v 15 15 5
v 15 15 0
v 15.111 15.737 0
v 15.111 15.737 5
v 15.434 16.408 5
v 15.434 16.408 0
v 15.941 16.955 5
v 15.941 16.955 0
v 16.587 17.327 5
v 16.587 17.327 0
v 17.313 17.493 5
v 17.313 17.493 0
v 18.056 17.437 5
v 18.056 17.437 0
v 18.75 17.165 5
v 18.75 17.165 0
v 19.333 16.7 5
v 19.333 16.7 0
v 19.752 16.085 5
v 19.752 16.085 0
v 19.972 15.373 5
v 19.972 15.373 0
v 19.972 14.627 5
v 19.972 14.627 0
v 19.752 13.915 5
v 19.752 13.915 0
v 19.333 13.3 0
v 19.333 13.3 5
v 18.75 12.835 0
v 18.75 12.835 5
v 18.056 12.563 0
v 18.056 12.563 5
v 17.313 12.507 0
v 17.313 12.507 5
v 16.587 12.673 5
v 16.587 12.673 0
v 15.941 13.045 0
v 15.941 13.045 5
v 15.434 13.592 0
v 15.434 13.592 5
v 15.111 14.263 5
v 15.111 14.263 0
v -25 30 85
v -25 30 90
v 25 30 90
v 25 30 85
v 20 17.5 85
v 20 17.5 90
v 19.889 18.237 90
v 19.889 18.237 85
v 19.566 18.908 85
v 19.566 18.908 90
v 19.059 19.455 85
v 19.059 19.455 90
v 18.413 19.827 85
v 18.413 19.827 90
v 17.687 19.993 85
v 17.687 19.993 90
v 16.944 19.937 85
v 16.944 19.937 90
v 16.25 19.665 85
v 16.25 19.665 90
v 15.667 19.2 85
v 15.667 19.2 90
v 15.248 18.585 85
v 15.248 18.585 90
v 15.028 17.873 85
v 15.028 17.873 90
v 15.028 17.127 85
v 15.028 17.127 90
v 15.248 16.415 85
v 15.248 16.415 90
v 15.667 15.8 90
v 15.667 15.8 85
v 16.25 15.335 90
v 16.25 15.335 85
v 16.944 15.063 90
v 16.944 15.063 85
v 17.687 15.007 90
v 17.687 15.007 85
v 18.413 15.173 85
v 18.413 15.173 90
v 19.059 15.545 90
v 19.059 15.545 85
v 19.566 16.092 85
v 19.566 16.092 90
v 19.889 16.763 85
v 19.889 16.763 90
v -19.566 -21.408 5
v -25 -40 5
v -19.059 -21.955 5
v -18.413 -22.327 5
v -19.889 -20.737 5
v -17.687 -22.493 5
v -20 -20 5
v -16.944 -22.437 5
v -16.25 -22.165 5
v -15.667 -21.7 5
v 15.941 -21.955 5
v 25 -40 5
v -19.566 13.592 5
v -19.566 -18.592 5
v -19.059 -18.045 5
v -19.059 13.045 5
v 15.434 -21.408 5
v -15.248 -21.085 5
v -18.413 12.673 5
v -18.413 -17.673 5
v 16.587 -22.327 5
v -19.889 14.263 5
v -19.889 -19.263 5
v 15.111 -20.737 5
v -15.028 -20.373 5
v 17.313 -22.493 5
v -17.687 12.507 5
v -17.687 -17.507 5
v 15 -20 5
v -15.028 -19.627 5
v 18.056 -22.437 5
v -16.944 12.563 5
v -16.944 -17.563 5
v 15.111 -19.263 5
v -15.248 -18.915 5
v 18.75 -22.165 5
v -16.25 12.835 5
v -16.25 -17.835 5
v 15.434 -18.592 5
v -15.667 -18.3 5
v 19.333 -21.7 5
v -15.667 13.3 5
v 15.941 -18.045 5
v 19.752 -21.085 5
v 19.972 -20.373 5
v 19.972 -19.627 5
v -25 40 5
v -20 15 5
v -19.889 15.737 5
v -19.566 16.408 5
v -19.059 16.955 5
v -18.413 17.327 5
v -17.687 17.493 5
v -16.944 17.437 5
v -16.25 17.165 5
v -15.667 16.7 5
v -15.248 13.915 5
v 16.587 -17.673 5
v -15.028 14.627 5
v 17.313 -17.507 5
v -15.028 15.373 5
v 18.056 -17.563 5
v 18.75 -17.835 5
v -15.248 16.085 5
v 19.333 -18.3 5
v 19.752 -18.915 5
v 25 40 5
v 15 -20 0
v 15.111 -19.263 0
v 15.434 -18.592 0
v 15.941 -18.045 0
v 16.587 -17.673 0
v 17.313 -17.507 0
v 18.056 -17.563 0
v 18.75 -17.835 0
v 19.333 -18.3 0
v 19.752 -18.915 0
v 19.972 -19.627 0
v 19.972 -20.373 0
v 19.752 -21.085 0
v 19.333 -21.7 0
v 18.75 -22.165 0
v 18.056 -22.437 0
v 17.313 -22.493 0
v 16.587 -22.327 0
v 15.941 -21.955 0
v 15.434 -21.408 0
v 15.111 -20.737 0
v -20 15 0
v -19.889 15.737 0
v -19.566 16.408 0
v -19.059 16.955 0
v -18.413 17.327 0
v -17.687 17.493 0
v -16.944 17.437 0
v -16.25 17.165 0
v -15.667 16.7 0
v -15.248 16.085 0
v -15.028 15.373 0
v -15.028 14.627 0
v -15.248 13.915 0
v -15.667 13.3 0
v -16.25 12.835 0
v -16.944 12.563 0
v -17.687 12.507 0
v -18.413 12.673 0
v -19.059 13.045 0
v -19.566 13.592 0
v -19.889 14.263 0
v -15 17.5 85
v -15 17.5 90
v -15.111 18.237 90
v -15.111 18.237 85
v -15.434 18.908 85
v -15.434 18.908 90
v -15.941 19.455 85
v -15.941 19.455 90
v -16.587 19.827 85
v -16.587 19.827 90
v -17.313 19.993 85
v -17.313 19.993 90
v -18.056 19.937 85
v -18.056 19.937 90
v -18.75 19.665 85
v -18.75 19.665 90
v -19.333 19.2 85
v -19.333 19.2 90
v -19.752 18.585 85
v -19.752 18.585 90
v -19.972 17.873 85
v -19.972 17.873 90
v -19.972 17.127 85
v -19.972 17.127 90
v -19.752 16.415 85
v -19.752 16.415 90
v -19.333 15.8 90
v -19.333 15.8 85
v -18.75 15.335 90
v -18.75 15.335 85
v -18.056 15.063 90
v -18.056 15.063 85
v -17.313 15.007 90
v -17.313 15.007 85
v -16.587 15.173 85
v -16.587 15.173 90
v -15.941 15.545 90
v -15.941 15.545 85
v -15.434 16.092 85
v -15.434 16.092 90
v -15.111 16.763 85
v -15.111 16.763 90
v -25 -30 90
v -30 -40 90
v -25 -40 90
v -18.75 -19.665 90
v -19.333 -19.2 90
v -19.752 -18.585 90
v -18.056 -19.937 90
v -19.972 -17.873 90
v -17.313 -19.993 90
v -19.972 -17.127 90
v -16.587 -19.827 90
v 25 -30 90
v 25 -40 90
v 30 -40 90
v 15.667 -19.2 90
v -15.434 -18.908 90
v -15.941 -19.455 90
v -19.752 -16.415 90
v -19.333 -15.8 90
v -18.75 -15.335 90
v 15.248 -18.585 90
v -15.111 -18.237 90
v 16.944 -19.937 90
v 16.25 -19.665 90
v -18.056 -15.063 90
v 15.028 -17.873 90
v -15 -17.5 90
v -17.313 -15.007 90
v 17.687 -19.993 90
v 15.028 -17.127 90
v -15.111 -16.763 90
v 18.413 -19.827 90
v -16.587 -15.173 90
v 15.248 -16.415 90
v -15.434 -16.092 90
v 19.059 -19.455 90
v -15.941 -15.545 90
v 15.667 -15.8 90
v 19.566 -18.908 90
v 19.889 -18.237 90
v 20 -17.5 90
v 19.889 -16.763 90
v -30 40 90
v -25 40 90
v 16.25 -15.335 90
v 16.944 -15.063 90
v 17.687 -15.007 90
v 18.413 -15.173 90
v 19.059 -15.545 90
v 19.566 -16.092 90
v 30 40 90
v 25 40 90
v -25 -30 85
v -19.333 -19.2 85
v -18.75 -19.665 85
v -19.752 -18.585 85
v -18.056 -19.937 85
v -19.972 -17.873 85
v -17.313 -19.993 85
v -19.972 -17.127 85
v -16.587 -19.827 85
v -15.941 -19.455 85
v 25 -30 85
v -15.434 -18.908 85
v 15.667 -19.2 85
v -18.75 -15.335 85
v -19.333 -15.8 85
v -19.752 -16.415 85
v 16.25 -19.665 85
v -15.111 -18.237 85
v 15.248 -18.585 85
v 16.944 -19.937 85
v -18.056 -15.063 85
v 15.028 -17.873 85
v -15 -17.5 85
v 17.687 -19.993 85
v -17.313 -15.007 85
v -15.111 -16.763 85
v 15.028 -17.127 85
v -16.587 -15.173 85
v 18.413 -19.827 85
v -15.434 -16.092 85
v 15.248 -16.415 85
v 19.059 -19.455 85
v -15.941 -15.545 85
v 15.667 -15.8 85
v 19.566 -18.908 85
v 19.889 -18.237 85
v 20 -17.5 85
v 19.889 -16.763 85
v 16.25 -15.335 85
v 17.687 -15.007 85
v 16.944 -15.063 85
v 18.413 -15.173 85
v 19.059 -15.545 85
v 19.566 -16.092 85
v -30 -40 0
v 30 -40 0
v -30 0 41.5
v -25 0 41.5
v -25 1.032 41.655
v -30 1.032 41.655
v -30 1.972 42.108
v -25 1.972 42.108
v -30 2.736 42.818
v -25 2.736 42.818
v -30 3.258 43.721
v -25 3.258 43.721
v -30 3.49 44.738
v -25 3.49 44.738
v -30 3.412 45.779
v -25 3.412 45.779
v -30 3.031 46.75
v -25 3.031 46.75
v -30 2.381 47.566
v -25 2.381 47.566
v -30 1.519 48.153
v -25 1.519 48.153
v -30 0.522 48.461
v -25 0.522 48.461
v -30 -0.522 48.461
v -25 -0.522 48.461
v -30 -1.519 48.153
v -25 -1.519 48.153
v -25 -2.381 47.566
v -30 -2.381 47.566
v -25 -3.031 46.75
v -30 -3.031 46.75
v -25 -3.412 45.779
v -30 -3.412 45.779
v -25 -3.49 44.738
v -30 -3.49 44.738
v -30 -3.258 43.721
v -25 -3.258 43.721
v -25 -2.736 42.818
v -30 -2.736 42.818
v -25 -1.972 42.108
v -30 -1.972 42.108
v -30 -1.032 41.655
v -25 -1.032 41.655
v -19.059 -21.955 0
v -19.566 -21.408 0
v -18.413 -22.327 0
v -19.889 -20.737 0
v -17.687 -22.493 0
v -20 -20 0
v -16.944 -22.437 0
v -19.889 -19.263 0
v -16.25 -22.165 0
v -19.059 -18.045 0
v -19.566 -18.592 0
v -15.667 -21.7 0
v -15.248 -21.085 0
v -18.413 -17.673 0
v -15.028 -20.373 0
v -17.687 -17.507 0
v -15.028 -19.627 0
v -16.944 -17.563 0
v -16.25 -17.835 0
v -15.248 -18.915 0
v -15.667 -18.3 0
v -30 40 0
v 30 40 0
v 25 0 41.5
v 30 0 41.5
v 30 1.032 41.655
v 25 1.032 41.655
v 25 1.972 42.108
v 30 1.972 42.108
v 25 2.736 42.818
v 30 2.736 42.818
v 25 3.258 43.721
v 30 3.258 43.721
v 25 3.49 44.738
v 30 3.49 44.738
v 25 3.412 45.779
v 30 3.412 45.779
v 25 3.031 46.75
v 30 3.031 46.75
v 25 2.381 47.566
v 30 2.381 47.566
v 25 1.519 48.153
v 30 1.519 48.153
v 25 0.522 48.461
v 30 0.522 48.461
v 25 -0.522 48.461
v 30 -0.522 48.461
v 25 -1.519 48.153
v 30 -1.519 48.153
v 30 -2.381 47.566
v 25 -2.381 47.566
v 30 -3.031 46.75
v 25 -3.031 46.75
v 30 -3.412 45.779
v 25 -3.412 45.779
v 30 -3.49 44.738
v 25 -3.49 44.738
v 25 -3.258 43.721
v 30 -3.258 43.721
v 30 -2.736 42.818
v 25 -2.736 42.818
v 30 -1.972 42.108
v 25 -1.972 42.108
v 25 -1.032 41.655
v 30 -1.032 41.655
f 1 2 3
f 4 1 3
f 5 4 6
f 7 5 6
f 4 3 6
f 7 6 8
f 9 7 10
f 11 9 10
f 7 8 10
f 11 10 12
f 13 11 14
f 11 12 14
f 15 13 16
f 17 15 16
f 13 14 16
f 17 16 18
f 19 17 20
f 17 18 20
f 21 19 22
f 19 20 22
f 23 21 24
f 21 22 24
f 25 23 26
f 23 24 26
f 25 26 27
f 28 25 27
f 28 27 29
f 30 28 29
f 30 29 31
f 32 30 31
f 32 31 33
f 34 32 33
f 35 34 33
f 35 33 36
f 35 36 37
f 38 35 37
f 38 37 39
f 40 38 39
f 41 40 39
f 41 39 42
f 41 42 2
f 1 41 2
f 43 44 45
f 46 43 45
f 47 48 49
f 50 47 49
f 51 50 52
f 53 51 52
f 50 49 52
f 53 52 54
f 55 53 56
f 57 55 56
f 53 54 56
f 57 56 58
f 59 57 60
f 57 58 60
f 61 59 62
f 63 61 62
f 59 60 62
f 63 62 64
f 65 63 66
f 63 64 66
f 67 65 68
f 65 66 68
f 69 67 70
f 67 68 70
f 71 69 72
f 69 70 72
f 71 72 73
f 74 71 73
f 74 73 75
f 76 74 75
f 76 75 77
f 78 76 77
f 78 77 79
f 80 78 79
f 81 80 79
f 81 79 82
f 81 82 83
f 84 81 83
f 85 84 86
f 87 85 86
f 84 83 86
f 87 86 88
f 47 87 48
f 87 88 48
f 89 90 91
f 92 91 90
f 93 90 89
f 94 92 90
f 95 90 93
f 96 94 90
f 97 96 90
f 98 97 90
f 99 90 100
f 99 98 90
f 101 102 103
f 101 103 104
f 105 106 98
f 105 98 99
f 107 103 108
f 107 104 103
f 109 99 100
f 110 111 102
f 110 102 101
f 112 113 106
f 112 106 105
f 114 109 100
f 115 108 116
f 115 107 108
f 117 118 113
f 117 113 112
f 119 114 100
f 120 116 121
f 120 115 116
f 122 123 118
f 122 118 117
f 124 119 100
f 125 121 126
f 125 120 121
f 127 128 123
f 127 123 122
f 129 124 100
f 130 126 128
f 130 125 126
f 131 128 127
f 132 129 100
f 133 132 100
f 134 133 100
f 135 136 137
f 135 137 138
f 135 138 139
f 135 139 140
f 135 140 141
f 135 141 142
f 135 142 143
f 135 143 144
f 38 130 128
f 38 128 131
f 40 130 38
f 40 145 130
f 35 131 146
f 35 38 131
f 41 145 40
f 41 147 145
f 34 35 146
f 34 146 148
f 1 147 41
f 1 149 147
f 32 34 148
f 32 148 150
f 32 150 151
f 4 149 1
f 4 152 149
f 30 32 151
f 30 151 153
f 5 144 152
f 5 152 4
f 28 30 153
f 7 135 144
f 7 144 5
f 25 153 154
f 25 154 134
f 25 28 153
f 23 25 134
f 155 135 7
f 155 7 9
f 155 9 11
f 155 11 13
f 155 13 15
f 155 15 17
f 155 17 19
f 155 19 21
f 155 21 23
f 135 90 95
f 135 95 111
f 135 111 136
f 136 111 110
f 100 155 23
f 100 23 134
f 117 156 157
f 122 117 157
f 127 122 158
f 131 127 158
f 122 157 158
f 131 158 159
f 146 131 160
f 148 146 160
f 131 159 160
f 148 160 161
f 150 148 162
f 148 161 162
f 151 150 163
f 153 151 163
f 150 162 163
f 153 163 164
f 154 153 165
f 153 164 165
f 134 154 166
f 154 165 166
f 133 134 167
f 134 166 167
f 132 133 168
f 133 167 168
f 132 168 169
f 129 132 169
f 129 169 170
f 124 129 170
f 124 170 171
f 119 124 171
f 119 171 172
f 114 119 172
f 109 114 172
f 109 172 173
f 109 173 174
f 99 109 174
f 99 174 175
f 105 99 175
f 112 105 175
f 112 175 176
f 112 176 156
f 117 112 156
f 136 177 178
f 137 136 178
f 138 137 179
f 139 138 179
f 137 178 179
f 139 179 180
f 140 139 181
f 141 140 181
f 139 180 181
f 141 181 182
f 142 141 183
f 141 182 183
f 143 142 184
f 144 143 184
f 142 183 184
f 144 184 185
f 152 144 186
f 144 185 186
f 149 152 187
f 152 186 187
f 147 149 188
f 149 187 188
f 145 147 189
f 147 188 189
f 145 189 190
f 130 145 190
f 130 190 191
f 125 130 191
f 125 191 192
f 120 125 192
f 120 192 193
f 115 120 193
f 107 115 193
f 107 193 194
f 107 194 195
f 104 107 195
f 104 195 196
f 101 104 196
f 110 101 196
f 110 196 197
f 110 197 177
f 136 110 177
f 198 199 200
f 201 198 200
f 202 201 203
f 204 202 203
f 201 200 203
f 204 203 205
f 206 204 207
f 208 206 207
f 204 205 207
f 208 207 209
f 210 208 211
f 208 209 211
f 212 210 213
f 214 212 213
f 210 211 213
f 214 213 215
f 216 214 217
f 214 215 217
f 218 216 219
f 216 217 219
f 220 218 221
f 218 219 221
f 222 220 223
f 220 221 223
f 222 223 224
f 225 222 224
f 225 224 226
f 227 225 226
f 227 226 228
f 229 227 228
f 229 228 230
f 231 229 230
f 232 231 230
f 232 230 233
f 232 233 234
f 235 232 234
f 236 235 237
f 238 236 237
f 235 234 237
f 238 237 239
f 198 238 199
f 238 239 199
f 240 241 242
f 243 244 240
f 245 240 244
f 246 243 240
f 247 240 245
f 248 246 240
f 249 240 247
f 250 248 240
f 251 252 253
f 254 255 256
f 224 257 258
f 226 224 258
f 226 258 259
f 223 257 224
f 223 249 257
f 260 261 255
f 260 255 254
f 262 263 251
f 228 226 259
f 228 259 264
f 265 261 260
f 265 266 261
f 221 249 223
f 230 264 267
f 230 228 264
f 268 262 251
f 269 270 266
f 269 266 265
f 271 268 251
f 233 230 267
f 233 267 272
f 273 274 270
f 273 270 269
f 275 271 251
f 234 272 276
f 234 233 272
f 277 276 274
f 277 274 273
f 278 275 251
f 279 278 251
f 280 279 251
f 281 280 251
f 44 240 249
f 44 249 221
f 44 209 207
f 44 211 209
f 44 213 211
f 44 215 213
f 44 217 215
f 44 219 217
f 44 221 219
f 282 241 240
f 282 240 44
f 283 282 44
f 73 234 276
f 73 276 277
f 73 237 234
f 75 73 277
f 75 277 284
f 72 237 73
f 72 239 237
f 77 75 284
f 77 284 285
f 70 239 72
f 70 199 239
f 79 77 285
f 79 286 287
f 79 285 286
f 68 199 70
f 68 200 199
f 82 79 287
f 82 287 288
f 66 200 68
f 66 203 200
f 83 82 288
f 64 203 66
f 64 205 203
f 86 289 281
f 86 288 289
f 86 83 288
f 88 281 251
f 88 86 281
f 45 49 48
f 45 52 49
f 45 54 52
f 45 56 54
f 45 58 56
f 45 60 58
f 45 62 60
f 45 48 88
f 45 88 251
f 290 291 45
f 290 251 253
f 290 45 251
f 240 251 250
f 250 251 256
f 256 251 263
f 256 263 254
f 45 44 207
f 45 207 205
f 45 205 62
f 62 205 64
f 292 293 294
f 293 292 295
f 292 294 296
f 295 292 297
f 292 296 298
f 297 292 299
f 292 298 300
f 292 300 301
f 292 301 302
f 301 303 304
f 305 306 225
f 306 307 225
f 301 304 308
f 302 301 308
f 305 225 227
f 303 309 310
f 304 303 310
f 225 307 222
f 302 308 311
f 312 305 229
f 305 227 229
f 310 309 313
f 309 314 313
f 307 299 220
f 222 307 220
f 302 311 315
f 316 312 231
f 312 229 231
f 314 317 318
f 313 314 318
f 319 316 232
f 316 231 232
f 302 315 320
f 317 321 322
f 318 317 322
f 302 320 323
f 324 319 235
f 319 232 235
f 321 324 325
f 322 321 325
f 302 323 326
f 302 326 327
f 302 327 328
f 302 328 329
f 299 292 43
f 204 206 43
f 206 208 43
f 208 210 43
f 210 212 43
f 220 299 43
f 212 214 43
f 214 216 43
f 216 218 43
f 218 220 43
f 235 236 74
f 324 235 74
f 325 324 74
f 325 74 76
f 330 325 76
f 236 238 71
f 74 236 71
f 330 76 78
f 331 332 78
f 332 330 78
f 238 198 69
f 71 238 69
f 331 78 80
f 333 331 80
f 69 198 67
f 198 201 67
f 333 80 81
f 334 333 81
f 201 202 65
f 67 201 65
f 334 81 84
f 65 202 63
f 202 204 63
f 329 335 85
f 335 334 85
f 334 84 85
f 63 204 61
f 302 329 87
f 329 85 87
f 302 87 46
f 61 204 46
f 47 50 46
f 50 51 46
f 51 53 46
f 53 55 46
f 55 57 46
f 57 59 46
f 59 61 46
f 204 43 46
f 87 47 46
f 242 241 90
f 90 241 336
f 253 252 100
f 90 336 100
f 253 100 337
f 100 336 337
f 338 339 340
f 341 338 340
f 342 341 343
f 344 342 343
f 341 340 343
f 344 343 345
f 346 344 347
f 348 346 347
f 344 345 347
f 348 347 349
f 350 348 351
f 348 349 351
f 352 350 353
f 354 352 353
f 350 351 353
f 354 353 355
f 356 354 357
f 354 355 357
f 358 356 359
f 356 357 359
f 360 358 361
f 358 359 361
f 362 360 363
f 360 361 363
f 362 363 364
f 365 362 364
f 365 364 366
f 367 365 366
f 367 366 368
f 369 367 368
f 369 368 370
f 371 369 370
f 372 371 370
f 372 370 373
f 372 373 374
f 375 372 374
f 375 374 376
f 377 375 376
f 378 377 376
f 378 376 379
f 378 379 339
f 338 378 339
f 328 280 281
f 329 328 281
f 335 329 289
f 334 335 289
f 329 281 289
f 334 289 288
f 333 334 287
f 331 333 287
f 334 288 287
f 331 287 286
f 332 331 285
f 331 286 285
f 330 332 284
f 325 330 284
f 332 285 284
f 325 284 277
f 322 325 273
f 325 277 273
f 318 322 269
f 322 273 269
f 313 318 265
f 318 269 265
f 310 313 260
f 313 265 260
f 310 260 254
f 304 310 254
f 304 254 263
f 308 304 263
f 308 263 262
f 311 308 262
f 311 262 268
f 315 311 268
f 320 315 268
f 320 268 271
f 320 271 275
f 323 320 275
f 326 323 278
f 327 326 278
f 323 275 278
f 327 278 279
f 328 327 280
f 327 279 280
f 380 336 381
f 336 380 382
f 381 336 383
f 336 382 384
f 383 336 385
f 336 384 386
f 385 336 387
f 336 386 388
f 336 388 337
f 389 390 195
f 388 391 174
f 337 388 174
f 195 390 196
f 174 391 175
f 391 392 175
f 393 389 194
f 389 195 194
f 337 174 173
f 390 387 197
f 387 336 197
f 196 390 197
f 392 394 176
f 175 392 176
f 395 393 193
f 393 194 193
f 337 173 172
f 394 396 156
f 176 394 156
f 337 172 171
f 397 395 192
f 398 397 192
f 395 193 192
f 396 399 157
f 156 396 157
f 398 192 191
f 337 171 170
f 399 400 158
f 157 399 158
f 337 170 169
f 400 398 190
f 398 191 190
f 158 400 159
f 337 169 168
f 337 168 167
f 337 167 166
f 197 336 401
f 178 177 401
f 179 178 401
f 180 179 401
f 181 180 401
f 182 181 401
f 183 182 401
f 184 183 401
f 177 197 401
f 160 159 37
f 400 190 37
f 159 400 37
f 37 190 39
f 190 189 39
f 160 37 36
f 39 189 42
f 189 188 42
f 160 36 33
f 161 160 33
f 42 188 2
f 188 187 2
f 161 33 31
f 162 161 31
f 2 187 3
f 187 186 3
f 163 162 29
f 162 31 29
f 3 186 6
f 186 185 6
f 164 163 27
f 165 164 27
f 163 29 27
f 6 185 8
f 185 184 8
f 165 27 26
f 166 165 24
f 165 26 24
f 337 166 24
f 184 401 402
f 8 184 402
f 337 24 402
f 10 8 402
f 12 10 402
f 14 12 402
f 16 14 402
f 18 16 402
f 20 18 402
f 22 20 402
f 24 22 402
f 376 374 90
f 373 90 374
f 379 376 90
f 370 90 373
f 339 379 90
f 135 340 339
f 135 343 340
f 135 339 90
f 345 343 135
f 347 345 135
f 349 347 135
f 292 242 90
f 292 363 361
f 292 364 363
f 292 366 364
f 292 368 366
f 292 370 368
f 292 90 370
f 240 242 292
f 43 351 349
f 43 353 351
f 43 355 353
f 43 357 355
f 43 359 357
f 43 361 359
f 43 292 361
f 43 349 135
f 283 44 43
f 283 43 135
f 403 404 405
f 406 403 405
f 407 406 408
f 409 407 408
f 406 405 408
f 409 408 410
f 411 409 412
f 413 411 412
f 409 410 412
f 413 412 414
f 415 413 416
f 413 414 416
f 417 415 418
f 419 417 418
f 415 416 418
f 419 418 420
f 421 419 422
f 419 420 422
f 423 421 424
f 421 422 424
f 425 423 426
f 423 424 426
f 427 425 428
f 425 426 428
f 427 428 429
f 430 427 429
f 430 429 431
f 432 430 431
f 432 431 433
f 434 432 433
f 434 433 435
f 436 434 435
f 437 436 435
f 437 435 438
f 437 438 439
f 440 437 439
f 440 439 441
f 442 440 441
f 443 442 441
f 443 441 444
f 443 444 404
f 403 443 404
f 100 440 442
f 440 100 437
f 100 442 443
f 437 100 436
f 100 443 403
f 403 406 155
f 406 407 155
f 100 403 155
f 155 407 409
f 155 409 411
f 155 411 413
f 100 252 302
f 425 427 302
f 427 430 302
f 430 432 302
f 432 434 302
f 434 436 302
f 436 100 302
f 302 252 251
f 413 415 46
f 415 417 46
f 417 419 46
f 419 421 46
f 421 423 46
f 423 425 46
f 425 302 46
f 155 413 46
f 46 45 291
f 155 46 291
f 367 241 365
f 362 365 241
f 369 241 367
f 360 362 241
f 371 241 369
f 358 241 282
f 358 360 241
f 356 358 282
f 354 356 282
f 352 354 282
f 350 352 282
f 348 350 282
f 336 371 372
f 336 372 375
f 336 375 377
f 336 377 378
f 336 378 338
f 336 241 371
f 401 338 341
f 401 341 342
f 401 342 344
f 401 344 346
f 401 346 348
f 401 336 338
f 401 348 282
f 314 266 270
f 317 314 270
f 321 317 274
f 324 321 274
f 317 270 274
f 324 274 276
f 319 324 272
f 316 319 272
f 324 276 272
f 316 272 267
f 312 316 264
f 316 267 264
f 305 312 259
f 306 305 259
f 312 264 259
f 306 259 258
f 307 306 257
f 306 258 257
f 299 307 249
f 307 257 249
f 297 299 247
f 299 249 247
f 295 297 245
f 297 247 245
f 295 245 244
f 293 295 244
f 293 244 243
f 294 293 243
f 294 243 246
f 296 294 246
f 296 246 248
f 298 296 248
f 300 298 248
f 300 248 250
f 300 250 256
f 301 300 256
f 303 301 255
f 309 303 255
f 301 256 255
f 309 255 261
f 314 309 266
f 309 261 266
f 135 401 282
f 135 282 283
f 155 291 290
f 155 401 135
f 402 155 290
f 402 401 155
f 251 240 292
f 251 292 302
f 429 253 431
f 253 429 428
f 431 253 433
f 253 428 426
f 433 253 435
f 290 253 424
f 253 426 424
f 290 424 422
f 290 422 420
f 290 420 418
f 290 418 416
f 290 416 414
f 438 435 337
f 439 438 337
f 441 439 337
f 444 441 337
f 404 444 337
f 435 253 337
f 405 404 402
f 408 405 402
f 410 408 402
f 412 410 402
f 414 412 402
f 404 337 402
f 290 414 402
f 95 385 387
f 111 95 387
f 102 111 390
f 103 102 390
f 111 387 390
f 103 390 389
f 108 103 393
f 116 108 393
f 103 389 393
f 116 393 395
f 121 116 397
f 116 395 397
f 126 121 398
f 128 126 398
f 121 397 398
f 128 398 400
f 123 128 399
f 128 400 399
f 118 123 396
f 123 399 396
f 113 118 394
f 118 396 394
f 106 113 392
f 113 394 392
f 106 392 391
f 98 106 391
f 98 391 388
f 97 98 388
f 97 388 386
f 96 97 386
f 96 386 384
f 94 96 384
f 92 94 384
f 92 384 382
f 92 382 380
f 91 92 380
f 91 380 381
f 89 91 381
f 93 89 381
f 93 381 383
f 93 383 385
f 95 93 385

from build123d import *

# Parameters (mm, degrees)
SKETCH1_W           = 60
SKETCH1_H           = 80
BOSS_EXTRUDE1_DEPTH = 80
SKETCH2_W           = 50
SKETCH2_H           = 75
CUT_EXTRUDE1_DEPTH  = 80
SKETCH3_R           = 2.5
CUT_EXTRUDE2_DEPTH  = 60
SKETCH4_R           = 3.5
CUT_EXTRUDE3_DEPTH  = 80
SKETCH5_W           = 5
SKETCH5_H           = 80
BOSS_EXTRUDE2_DEPTH = 5
SKETCH6_W           = 60
SKETCH6_H           = 80
BOSS_EXTRUDE3_DEPTH = 5
SKETCH7_R           = 2.5
CUT_EXTRUDE4_DEPTH  = 5
SKETCH8_W           = 50
SKETCH8_H           = 10
CUT_EXTRUDE5_DEPTH  = 5


with BuildPart() as part:
    # Sketch1 → Boss-Extrude1 (new body)
    with BuildSketch(Plane.XY):
        Rectangle(SKETCH1_W, SKETCH1_H)
    extrude(amount=BOSS_EXTRUDE1_DEPTH)

    # Sketch2 → Cut-Extrude1 (cut)
    with BuildSketch(Plane(origin=(0, 40, 0), x_dir=(1, 0, 0), z_dir=(0, 1, 0))):
        with Locations((0, -42.5)):
            Rectangle(SKETCH2_W, SKETCH2_H)
    extrude(amount=-CUT_EXTRUDE1_DEPTH, mode=Mode.SUBTRACT)

    # Sketch3 → Cut-Extrude2 (cut)
    with BuildSketch(Plane(origin=(0, 0, 0), x_dir=(-1, 0, 0), z_dir=(0, 0, -1))):
        with Locations((-17.5, 15)):
            Circle(SKETCH3_R)
        with Locations((17.5, 15)):
            Circle(SKETCH3_R)
        with Locations((-17.5, -20)):
            Circle(SKETCH3_R)
        with Locations((17.5, -20)):
            Circle(SKETCH3_R)
    extrude(amount=-CUT_EXTRUDE2_DEPTH, mode=Mode.SUBTRACT)

    # Sketch4 → Cut-Extrude3 (cut)
    with BuildSketch(Plane(origin=(30, 0, 0), x_dir=(0, 0, -1), z_dir=(1, 0, 0))):
        with Locations((-45, 0)):
            Circle(SKETCH4_R)
    extrude(amount=-CUT_EXTRUDE3_DEPTH, mode=Mode.SUBTRACT)

    # Sketch5 → Boss-Extrude2 (add)
    with BuildSketch(Plane.XY.offset(80)):
        with Locations((-27.5, 0)):
            Rectangle(SKETCH5_W, SKETCH5_H)
        with Locations((27.5, 0)):
            Rectangle(SKETCH5_W, SKETCH5_H)
    extrude(amount=BOSS_EXTRUDE2_DEPTH)

    # Sketch6 → Boss-Extrude3 (add)
    with BuildSketch(Plane.XY.offset(85)):
        Rectangle(SKETCH6_W, SKETCH6_H)
    extrude(amount=BOSS_EXTRUDE3_DEPTH)

    # Sketch7 → Cut-Extrude4 (cut)
    with BuildSketch(Plane.XY.offset(90)):
        with Locations((-17.5, 17.5)):
            Circle(SKETCH7_R)
        with Locations((17.5, 17.5)):
            Circle(SKETCH7_R)
        with Locations((17.5, -17.5)):
            Circle(SKETCH7_R)
        with Locations((-17.5, -17.5)):
            Circle(SKETCH7_R)
    extrude(amount=-CUT_EXTRUDE4_DEPTH, mode=Mode.SUBTRACT)

    # Sketch8 → Cut-Extrude5 (cut)
    with BuildSketch(Plane.XY.offset(90)):
        with Locations((0, 35)):
            Rectangle(SKETCH8_W, SKETCH8_H)
        with Locations((0, -35)):
            Rectangle(SKETCH8_W, SKETCH8_H)
    extrude(amount=-CUT_EXTRUDE5_DEPTH, mode=Mode.SUBTRACT)


solid = part.part
